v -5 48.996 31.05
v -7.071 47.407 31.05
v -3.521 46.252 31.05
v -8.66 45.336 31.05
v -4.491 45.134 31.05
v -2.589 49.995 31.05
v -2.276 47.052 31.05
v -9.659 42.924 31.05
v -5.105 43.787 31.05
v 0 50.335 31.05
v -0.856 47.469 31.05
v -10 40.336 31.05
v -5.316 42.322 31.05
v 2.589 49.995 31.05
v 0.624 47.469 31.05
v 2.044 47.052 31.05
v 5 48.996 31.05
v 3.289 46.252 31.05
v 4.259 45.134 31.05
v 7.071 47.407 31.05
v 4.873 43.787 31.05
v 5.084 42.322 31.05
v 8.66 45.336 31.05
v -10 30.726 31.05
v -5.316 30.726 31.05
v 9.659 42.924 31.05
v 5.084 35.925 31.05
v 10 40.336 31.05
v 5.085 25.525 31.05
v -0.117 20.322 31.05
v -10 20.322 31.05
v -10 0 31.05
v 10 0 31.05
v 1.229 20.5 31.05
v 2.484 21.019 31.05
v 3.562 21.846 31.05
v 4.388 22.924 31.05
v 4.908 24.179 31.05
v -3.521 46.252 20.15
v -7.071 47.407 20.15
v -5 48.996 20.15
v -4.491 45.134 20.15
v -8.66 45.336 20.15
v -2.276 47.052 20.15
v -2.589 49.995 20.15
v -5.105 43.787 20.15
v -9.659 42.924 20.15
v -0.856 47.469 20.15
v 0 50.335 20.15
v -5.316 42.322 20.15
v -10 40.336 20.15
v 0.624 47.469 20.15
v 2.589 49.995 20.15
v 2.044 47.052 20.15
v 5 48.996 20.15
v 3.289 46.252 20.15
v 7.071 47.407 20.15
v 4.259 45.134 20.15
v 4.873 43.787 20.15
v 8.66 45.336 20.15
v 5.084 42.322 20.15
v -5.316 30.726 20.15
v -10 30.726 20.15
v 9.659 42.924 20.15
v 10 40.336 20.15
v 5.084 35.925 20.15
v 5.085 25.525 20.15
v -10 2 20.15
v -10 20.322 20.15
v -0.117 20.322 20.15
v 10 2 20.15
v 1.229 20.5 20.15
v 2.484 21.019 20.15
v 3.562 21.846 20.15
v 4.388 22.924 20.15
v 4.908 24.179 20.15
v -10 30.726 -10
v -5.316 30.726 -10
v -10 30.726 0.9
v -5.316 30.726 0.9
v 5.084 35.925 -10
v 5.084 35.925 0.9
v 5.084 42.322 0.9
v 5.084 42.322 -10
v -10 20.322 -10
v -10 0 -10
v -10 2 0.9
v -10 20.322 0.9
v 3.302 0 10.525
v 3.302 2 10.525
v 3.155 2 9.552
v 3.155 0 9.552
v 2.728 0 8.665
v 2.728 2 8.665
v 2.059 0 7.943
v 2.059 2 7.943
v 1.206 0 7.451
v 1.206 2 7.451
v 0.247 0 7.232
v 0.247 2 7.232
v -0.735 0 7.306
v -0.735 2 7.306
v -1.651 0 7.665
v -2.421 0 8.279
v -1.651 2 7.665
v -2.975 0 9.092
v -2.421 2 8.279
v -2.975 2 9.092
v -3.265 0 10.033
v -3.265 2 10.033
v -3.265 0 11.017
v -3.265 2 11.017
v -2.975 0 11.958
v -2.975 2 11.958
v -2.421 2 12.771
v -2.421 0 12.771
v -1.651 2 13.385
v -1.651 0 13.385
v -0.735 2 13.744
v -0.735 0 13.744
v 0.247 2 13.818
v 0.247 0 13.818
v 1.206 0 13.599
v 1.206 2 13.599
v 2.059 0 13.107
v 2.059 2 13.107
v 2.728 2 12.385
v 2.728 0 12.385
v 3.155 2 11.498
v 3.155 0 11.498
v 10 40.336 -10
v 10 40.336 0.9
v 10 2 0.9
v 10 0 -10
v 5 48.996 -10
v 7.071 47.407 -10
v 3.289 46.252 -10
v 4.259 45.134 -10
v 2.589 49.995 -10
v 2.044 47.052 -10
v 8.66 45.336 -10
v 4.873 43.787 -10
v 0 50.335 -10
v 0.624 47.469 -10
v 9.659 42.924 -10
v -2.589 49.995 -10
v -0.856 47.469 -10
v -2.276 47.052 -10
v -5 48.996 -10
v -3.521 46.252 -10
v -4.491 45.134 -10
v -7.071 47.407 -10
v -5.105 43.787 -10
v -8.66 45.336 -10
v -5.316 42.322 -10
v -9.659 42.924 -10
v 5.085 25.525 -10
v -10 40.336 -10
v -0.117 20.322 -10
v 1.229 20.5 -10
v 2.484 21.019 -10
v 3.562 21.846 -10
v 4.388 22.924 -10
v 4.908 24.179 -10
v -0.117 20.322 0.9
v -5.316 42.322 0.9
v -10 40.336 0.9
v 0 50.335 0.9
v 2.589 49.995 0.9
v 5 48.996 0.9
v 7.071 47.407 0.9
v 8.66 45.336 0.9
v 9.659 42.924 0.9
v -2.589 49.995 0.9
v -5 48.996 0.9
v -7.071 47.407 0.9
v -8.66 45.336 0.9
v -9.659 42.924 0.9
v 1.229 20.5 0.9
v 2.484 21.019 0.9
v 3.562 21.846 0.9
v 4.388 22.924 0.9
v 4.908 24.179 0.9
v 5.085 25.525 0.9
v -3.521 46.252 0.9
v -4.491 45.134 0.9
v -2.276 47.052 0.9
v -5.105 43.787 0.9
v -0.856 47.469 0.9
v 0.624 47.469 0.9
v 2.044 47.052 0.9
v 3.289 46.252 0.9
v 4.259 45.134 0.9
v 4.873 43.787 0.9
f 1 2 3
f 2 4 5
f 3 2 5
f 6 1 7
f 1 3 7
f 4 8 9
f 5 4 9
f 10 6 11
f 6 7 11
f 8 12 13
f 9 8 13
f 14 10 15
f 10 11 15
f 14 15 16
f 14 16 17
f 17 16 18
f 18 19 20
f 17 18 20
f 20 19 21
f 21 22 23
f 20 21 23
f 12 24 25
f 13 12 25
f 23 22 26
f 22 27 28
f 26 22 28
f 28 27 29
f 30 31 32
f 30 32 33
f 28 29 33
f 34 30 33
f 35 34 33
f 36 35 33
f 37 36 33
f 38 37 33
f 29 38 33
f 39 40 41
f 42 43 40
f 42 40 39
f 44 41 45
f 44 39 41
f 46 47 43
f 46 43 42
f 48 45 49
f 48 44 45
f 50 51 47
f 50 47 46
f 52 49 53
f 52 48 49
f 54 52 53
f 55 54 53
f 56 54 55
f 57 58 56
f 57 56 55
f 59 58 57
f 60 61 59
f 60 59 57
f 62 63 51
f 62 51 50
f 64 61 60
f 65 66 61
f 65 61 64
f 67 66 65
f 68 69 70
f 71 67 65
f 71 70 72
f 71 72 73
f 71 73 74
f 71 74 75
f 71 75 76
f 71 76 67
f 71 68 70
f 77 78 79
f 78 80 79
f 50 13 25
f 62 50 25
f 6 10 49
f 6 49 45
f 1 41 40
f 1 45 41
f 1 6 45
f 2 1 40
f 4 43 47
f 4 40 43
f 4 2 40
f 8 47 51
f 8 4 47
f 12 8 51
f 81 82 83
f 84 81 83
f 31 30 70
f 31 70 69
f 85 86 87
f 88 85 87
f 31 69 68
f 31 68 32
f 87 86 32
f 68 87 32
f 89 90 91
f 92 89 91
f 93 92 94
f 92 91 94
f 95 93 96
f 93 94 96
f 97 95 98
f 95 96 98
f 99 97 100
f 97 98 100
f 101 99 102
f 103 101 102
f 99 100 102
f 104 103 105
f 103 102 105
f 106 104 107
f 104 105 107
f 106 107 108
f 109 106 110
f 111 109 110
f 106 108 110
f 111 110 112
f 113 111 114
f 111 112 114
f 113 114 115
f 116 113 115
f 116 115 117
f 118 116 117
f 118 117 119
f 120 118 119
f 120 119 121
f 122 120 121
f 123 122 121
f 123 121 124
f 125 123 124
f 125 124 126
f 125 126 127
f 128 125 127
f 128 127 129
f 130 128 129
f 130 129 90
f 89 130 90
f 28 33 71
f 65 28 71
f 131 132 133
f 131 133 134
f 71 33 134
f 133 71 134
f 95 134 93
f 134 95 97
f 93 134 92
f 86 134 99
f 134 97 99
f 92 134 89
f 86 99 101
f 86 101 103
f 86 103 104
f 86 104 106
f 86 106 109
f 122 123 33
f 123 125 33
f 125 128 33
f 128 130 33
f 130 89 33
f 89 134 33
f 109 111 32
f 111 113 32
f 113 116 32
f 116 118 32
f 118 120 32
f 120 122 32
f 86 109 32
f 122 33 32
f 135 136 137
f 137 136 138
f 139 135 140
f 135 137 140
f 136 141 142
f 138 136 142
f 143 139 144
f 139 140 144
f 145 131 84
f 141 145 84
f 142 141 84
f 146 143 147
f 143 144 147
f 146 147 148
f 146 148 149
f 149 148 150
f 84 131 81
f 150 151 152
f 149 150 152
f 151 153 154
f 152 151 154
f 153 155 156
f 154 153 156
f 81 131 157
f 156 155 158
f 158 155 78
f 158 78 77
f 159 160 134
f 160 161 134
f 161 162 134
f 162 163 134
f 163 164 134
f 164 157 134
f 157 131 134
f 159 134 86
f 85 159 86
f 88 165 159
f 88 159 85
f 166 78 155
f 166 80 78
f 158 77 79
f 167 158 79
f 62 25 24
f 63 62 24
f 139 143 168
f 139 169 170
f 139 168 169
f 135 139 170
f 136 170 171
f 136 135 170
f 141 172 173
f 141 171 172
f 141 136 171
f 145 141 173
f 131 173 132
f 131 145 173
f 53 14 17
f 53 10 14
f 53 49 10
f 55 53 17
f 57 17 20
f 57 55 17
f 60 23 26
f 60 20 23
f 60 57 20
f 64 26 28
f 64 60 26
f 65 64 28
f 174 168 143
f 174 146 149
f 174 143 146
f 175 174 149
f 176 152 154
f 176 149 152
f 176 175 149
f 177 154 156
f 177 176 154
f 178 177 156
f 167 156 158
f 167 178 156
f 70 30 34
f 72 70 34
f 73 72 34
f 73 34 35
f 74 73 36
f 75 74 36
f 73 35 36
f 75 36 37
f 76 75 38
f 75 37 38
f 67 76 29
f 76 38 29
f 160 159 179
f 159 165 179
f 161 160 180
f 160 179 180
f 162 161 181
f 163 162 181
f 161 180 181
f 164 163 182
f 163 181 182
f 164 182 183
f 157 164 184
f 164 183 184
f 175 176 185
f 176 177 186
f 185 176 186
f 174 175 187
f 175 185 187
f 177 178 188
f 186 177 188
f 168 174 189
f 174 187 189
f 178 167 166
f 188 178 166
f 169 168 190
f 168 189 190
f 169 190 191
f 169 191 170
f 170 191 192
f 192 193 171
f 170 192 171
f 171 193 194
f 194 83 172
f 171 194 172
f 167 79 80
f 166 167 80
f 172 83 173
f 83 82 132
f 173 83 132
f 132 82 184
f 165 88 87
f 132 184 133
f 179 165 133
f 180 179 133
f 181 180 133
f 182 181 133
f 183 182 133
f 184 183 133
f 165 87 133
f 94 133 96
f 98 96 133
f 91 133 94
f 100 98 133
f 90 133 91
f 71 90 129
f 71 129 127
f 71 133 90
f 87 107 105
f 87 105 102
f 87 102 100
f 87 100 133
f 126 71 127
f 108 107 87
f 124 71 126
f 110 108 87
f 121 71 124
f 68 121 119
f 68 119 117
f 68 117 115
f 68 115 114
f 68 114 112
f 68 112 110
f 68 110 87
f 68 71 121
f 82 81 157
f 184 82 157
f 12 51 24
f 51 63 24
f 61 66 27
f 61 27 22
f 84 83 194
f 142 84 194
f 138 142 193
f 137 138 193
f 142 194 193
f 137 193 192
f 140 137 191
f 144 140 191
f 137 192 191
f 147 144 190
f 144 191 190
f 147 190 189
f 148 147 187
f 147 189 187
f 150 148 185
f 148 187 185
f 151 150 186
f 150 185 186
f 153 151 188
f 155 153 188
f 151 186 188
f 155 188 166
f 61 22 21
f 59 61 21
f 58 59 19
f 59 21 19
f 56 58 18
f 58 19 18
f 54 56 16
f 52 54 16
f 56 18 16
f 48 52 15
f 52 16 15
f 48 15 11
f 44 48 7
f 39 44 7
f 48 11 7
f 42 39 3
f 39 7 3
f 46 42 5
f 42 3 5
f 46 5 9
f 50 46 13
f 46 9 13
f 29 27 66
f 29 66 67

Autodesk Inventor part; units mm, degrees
ref_plane "YZ Plane" through (0, 0, 0) normal (1, 0, 0) x (0, 1, 0)
ref_plane "XZ Plane" through (0, 0, 0) normal (0, 1, 0) x (-1, 0, 0)
ref_plane "XY Plane" through (0, 0, 0) normal (0, 0, 1) x (1, 0, 0)
sketch "Sketch1" plane through (0, 0, 0) normal (0, 1, 0) x (-1, 0, 0)
  line L0 (10, 31.05) -> (-10, 31.05)
  line L1 (-10, 31.05) -> (-10, -10)
  line L2 (-10, -10) -> (10, -10)
  line L3 (10, -10) -> (10, 31.05)
  point P0 (0, 0)
  dimension "d0" = 20
  dimension "d1" = 41.05
extrude "Extrusion1" add sketch "Sketch1" along normal blind 2
sketch "Sketch2" plane through (0, 2, 0) normal (0, 1, 0) x (1, 0, 0)
  line L0 (-10, -31.05) -> (10, -31.05) projected
  line L1 (0, -31.05) -> (-6.35, -31.05)
  line L2 (-6.35, -20.15) -> (6.35, -20.15)
  line L3 (6.35, -31.05) -> (0, -31.05)
  line L4 (10, 10) -> (-10, 10) projected
  line L5 (-6.35, -0.9) -> (6.35, -0.9)
  line L6 (-6.35, 10) -> (6.35, 10)
  line L7 (-6.35, -31.05) -> (-10, -31.05)
  line L8 (-10, 10) -> (-10, -31.05) projected
  line L9 (-10, -20.15) -> (-6.35, -20.15)
  line L10 (6.35, -31.05) -> (10, -31.05)
  line L11 (10, -31.05) -> (10, 10) projected
  line L12 (10, -20.15) -> (6.35, -20.15)
  line L13 (6.35, -0.9) -> (10, -0.9)
  line L14 (10, 10) -> (6.35, 10)
  line L15 (10, -0.9) -> (10, 10)
  line L16 (10, -31.05) -> (10, -20.15)
  line L17 (-10, -31.05) -> (-10, -20.15)
  line L18 (-6.35, -0.9) -> (-10, -0.9)
  line L19 (-10, -0.9) -> (-10, 10)
  line L20 (-10, 10) -> (-6.35, 10)
  point P0 (0, 0)
  dimension "d4" = 6.35
  dimension "d5" = 10.9
  dimension "d6" = 12.7
  dimension "d7" = 10.9
extrude "Extrusion2" add sketch "Sketch2" along normal blind 48.3354 contours L8 L9 L2 L12 L11 L0 | L8 L4 L11 L13 L5 L18
sketch "Sketch9" plane through (-10, 0, 31.05) normal (0, 0, 1) x (1, 0, 0)
  arc A0 (15.084, 42.3223) -> (4.684, 42.3223) centre (9.884, 42.3223) ccw
  line L0 (15.084, 35.9247) -> (15.084, 42.3223)
  line L1 (4.684, 41.1247) -> (4.684, 42.3223)
  arc A1 (15.084, 42.3223) -> (4.684, 42.3223) centre (9.884, 42.3223) ccw
  line L2 (4.684, 42.3223) -> (4.684, 35.9247)
  line L3 (9.8827, 20.3222) -> (-0.0013, 20.3222)
  line L4 (-0.0013, 30.726) -> (-0.0013, 20.3222)
  line L5 (4.684, 35.9247) -> (4.684, 30.726)
  line L6 (15.084, 35.9247) -> (15.0853, 25.5254)
  arc A2 (15.084, 35.9247) -> (15.084, 35.9251) centre (9.884, 35.9243) ccw
  line L7 (4.684, 30.726) -> (-0.0013, 30.726)
  arc A3 (9.8827, 20.3222) -> (15.0853, 25.5254) centre (9.8827, 25.5248) ccw
  point P0 (10, 0)
fillet "Fillet4" radius 10 4 edges at (10, 50.3354, 25.6) (-10, 50.3354, 25.6) (-10, 50.3354, -4.55) (10, 50.3354, -4.55)
sketch "Sketch10" plane through (0, 2, 0) normal (0, 1, 0) x (1, 0, 0)
  line L0 (10, -31.05) -> (-10, -31.05) projected
  line L1 (-10, 10) -> (10, 10) projected
  line L2 (10, -20.15) -> (10, -0.9) projected
  line L3 (-10, -0.9) -> (-10, -20.15) projected
  line L4 (10, -10.525) -> (-10, -10.525)
  circle A0 centre (0, -10.525) radius 3.302
  point P0 (0, 0)
  dimension "d53" = 41.05
  dimension "d54" = 6.604
extrude "Extrusion10" cut sketch "Sketch10" against normal blind 2
extrude "Extrusion11" cut sketch "Sketch9" against normal through all
properties part number "6 Backet Adjustment"
